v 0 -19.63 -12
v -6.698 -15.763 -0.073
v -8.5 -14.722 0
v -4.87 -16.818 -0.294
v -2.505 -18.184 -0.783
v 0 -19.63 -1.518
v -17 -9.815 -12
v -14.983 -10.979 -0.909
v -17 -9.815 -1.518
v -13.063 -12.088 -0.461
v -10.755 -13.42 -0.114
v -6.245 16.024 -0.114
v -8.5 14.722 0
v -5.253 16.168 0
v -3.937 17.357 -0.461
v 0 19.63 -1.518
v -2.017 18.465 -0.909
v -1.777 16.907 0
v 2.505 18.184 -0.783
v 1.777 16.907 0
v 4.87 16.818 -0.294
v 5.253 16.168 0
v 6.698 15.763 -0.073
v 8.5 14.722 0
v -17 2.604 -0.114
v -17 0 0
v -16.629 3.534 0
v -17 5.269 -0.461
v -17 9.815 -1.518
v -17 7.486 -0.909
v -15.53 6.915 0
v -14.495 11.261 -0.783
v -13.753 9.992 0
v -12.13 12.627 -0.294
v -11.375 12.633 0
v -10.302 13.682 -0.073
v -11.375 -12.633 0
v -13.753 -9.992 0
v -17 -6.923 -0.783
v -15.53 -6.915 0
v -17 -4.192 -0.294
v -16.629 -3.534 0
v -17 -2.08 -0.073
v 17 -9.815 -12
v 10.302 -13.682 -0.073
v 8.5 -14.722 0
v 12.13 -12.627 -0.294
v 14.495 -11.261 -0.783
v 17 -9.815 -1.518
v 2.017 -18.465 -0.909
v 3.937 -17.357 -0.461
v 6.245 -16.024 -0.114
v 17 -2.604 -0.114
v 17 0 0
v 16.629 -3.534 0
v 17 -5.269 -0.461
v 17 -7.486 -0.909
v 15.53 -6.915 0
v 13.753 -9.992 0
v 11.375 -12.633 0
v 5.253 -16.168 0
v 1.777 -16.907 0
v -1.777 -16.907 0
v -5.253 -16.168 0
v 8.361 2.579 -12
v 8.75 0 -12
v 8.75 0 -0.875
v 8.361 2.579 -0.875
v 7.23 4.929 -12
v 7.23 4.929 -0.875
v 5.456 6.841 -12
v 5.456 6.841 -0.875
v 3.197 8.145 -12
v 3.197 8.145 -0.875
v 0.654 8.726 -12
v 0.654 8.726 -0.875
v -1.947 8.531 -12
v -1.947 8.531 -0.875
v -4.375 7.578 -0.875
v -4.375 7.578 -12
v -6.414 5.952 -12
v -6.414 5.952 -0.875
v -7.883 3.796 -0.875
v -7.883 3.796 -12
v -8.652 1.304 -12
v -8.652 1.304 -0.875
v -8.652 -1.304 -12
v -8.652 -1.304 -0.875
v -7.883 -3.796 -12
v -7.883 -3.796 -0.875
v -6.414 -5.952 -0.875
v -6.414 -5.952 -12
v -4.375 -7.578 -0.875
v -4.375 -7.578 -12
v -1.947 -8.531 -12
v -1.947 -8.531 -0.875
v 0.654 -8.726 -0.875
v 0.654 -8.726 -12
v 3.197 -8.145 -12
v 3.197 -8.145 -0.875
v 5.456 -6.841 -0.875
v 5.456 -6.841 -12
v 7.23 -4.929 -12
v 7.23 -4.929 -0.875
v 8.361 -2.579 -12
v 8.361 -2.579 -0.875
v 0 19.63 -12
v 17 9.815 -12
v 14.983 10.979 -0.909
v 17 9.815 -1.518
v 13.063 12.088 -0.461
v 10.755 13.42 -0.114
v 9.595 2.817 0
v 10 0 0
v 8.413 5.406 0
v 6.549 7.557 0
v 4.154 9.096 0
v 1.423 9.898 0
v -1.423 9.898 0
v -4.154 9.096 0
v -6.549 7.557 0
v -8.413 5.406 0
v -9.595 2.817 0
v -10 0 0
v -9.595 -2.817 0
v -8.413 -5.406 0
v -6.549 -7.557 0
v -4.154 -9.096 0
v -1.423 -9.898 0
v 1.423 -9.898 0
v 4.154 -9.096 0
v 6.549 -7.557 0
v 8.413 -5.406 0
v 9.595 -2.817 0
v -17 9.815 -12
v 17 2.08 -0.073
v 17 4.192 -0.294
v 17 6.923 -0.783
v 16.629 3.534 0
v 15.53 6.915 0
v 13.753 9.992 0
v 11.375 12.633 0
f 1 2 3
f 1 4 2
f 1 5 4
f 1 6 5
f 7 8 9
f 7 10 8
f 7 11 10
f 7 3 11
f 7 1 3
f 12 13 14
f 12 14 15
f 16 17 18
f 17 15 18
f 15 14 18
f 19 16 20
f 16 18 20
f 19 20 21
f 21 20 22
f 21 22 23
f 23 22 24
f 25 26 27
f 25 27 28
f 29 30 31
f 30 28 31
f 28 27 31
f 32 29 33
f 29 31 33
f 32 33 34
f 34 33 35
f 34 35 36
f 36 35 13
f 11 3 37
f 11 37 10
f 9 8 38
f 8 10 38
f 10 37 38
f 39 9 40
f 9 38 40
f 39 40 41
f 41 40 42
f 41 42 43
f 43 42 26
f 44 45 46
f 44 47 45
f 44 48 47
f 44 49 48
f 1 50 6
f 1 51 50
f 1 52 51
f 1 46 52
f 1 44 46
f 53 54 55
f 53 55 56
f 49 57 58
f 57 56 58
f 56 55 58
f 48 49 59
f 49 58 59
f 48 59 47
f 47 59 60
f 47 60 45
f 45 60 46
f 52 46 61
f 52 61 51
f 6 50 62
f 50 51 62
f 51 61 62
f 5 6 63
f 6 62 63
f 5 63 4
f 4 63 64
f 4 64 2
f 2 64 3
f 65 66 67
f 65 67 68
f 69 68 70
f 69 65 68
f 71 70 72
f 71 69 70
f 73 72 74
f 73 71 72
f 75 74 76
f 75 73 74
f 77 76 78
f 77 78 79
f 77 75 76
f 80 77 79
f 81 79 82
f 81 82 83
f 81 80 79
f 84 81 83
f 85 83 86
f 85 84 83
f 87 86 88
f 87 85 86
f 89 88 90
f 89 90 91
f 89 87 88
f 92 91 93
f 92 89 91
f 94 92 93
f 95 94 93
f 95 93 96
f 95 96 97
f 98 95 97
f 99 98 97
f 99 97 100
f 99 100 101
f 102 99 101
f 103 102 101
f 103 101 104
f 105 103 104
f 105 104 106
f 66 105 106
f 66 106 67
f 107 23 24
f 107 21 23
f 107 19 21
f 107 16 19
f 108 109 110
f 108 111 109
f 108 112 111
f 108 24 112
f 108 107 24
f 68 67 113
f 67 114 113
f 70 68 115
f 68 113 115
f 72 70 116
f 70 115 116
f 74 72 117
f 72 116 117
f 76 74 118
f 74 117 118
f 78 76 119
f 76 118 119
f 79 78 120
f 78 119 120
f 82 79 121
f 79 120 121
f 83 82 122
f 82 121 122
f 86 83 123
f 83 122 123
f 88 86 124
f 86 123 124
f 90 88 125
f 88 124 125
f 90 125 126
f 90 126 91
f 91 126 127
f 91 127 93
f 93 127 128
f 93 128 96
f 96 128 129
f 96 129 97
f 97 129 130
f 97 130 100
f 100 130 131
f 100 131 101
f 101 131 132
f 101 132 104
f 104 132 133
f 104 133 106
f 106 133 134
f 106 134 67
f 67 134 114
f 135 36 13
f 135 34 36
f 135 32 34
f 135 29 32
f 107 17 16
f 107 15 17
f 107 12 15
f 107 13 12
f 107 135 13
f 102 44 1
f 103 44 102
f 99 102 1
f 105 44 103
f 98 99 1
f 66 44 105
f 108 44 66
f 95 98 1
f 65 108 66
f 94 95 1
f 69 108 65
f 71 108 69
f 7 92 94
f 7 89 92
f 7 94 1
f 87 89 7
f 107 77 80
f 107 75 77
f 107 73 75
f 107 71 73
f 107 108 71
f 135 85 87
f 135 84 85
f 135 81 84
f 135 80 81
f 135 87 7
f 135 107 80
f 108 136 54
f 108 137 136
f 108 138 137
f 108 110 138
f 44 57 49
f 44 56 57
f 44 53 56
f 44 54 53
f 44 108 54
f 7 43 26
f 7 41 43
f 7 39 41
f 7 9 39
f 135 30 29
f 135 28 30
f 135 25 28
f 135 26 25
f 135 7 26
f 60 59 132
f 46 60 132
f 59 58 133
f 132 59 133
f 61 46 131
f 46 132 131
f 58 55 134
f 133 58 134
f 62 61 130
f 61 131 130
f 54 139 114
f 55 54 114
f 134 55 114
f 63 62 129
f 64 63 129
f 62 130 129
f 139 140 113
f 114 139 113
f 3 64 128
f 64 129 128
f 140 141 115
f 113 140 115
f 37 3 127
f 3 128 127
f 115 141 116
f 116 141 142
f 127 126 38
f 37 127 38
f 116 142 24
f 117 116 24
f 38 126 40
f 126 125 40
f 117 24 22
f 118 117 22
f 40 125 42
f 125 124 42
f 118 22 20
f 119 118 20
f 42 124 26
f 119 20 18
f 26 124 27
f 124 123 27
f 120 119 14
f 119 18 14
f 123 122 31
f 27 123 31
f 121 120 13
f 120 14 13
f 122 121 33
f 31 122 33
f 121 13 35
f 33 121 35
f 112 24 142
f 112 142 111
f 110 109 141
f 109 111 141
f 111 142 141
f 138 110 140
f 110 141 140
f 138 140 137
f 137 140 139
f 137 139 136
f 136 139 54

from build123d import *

# Parameters (mm, degrees)
BASENUT_START         = -18
BASENUTSKE_R          = 8.75
BASENUT_DEPTH         = 18
SKETCH4_W             = 0.8
SKETCH4_H             = 12.629909152
IZIM1_W               = 62.269157962
IZIM1_H               = 48.757925573
KES_EKSTR_ZYON1_DEPTH = 6


# Read off the part's stored shape, not the designer's step: ThreadSchematic
with BuildPart() as part:
    # BaseNutSke → BaseNut (new body)
    with BuildSketch(Plane.XY.offset(BASENUT_START)):
        Polygon((17, 9.814954576), (17, -9.814954576), (0, -19.629909152), (-17, -9.814954576), (-17, 9.814954576), (0, 19.629909152), align=None)
        Circle(BASENUTSKE_R, mode=Mode.SUBTRACT)
    extrude(amount=BASENUT_DEPTH)

    # Sketch5 (on Front Plane) → EndChamfer (revolve, cut)
    with BuildSketch(Plane.XY):
        Polygon((17.9746, 10), (17.011814635, 8.625), (18.0254, 8.625), (18.0254, 10), align=None)
    revolve(axis=Axis((17.9746, 10, 0), (-0.5735764363510453, -0.8191520442889925, 0)), mode=Mode.SUBTRACT)

    # Sketch4 → Bearing-Face (revolve, cut)
    with BuildSketch(Plane(origin=(0, 0, 0), x_dir=(0, 0, -1), z_dir=(1, 0, 0)), mode=Mode.PRIVATE) as bearing_face_sk:
        with Locations((17.6, 23.314954576)):
            Rectangle(SKETCH4_W, SKETCH4_H)
        Polygon((0, 17), (-10, 17), (-10, 29.629909152), (1.518378757, 29.629909152), (1.518378757, 19.629909152), align=None)
    revolve(bearing_face_sk.sketch.rotate(Axis((0, 0, 0), (0, 0, -1)), 270), axis=Axis((0, 0, 0), (0, 0, -1)), mode=Mode.SUBTRACT)

    # ThreadSchematic outline → ThreadSchematic (revolve, cut)
    with BuildSketch(Plane.XZ):
        Polygon((8.75, 0), (8.75, -0.875259423), (10, 0), align=None)
        Polygon((10, -17.9746), (8.75, -17.099340577), (8.75, -18), (10, -18), align=None)
    revolve(axis=Axis((0, 0, 0), (0, 0, 1)), mode=Mode.SUBTRACT)

    # Çizim1 → Kes-Ekstrüzyon1 (cut)
    with BuildSketch(Plane(origin=(0, 0, -18), x_dir=(-1, 0, 0), z_dir=(0, 0, -1))):
        with Locations((0.923127679, 2.056057103)):
            Rectangle(IZIM1_W, IZIM1_H)
    extrude(amount=-KES_EKSTR_ZYON1_DEPTH, mode=Mode.SUBTRACT)


solid = part.part
